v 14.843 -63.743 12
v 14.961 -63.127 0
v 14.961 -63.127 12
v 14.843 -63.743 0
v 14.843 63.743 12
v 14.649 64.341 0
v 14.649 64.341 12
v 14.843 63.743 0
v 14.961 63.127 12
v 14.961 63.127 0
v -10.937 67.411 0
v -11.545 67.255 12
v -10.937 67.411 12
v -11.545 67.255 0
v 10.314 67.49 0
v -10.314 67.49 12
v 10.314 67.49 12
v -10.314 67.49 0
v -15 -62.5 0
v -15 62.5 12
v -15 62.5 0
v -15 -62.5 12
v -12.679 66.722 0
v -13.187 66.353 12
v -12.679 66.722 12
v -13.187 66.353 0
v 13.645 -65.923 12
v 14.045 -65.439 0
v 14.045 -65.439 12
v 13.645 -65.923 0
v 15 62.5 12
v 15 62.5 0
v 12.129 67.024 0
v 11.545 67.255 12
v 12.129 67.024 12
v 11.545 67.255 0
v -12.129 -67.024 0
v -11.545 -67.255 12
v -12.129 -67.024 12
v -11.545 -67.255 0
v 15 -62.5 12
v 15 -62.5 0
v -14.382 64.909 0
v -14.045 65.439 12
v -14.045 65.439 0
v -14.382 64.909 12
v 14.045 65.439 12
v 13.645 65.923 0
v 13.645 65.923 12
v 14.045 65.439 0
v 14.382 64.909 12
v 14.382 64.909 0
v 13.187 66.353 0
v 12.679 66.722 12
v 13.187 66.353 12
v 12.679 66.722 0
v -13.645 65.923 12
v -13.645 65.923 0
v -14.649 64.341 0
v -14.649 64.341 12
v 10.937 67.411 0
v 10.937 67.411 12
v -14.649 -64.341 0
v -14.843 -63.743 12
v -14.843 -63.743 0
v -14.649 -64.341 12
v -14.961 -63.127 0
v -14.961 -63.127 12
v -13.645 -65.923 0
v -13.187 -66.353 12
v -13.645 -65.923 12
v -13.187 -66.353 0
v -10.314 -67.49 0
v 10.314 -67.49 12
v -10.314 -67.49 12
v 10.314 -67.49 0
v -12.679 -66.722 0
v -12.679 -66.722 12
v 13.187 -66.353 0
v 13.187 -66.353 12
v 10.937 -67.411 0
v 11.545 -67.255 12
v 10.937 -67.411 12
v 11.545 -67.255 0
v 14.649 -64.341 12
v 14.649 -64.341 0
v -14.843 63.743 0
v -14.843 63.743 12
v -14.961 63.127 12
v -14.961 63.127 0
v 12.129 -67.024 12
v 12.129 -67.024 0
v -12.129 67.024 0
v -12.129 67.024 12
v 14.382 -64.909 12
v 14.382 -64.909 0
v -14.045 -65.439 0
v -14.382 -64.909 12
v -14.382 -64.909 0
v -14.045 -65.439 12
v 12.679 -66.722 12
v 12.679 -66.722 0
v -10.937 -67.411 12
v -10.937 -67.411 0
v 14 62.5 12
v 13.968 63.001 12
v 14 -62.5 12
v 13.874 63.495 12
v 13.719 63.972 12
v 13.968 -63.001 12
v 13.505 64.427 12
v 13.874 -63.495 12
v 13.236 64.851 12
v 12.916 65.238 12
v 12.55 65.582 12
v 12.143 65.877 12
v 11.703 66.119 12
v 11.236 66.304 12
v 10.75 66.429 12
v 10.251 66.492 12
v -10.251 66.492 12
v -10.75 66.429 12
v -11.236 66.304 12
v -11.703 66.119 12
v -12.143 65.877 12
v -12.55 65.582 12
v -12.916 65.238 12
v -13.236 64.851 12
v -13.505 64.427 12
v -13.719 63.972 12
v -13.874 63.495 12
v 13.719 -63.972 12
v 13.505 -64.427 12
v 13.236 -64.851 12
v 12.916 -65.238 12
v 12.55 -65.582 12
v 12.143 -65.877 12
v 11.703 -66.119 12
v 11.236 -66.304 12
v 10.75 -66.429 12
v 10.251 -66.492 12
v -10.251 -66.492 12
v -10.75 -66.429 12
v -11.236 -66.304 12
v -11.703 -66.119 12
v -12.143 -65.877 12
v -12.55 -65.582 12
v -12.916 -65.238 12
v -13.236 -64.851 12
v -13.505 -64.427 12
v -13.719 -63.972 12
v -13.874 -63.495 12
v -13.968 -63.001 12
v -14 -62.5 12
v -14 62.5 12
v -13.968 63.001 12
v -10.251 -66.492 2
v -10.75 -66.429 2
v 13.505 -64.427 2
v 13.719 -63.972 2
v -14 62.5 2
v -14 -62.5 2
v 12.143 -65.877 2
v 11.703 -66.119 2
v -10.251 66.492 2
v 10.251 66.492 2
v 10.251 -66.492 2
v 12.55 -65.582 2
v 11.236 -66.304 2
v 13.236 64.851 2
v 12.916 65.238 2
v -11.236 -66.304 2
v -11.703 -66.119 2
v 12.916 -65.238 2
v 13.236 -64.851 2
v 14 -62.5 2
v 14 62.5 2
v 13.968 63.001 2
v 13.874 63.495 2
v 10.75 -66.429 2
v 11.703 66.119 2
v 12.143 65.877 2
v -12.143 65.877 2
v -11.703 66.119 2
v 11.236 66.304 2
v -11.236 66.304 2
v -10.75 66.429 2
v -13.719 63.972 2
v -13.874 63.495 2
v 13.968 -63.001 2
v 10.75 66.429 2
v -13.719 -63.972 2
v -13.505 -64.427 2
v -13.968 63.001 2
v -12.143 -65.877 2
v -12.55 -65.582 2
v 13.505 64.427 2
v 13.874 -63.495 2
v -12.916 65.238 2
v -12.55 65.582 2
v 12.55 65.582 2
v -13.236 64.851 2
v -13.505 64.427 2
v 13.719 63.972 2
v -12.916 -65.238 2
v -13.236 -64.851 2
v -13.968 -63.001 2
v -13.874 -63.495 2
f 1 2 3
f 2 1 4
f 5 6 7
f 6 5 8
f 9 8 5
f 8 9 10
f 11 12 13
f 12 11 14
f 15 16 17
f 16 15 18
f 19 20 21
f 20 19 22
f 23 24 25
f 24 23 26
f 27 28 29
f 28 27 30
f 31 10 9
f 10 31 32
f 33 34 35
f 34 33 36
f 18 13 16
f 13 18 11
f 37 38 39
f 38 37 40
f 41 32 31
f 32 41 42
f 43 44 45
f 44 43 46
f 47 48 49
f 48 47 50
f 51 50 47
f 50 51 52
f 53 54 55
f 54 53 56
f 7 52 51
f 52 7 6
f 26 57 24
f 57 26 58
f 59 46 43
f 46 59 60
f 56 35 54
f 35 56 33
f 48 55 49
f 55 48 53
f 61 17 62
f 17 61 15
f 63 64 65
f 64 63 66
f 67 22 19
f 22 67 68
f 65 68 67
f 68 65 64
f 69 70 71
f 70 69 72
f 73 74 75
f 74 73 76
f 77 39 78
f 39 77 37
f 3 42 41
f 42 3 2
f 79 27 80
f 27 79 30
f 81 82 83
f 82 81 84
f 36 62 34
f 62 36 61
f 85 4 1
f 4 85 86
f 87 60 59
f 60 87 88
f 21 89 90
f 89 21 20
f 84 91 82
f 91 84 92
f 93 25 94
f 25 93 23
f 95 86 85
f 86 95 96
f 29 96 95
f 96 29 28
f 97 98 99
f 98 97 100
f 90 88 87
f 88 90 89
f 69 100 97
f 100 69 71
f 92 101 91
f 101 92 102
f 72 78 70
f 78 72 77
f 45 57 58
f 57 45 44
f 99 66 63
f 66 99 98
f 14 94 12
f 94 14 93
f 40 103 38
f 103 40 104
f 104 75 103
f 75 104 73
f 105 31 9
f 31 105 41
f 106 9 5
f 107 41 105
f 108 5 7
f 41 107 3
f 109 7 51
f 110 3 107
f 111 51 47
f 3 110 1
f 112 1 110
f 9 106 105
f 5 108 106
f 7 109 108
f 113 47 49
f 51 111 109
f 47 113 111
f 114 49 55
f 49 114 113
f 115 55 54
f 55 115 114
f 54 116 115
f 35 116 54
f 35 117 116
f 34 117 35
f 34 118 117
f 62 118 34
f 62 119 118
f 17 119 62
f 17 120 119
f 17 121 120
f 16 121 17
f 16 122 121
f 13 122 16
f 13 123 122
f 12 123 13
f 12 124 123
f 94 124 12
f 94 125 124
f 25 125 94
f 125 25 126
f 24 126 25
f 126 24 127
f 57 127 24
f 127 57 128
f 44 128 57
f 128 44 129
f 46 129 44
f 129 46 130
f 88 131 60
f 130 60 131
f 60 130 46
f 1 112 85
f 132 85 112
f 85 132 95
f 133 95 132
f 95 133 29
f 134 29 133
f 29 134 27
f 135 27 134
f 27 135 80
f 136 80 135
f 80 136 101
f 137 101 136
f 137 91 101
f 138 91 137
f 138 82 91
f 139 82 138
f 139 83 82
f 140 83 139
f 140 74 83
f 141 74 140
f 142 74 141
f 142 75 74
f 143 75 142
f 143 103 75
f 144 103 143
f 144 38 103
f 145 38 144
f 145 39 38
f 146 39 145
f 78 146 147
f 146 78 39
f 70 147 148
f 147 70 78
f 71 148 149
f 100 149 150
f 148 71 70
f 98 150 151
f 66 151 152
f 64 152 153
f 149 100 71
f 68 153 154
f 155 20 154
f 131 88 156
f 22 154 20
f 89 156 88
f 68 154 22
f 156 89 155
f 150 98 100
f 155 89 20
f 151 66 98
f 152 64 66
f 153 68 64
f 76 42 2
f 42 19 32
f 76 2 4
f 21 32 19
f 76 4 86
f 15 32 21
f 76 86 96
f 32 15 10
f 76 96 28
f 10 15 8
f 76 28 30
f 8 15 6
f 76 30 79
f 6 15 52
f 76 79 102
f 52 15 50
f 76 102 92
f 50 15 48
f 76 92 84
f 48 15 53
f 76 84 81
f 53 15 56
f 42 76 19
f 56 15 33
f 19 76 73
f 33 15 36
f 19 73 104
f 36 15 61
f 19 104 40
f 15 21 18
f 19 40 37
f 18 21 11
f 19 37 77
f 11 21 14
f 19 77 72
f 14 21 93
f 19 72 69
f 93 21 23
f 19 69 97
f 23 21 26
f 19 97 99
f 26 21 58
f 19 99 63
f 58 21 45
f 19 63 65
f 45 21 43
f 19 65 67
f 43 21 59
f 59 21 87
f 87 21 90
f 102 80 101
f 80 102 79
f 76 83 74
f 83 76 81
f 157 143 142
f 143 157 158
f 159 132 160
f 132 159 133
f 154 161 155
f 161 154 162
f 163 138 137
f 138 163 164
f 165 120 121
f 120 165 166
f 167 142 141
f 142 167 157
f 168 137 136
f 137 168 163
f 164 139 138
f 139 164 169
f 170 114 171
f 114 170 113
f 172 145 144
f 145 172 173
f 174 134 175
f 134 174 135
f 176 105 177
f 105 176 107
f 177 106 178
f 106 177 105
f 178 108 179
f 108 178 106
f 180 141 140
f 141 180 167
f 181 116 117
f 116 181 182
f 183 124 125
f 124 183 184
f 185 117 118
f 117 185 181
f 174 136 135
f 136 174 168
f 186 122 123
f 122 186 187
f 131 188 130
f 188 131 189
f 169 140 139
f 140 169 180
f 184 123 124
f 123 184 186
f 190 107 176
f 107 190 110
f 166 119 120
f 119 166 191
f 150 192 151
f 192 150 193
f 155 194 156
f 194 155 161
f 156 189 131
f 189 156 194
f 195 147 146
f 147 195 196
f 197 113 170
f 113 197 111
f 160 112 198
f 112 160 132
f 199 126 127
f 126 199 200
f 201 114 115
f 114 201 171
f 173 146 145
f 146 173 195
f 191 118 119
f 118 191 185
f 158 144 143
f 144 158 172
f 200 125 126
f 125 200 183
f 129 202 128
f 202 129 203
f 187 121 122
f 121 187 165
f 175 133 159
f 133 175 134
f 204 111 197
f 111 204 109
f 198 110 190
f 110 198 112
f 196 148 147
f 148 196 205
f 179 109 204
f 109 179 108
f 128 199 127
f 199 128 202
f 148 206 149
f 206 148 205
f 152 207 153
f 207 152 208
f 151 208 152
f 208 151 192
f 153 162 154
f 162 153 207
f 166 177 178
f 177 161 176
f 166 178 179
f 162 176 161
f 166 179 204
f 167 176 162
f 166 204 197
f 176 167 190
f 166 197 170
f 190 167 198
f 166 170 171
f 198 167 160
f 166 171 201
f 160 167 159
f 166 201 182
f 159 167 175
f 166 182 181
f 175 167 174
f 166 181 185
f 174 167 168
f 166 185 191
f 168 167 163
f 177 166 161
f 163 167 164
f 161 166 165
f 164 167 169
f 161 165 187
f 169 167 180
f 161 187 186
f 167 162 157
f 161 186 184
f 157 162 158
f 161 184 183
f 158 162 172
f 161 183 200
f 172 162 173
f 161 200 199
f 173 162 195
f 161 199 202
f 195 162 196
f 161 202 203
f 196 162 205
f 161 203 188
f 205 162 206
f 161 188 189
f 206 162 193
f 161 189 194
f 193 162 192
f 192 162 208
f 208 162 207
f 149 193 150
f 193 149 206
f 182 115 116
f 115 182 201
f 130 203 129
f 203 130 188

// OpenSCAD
$fn = 50;


difference() {
	union() {
		hull() {
			translate(v = [-10.0000000000, 62.5000000000, 0]) {
				cylinder(h = 12, r = 5);
			}
			translate(v = [10.0000000000, 62.5000000000, 0]) {
				cylinder(h = 12, r = 5);
			}
			translate(v = [-10.0000000000, -62.5000000000, 0]) {
				cylinder(h = 12, r = 5);
			}
			translate(v = [10.0000000000, -62.5000000000, 0]) {
				cylinder(h = 12, r = 5);
			}
		}
	}
	union() {
		translate(v = [0, 0, 2]) {
			hull() {
				translate(v = [-10.0000000000, 62.5000000000, 0]) {
					cylinder(h = 10, r = 4);
				}
				translate(v = [10.0000000000, 62.5000000000, 0]) {
					cylinder(h = 10, r = 4);
				}
				translate(v = [-10.0000000000, -62.5000000000, 0]) {
					cylinder(h = 10, r = 4);
				}
				translate(v = [10.0000000000, -62.5000000000, 0]) {
					cylinder(h = 10, r = 4);
				}
			}
		}
	}
}
